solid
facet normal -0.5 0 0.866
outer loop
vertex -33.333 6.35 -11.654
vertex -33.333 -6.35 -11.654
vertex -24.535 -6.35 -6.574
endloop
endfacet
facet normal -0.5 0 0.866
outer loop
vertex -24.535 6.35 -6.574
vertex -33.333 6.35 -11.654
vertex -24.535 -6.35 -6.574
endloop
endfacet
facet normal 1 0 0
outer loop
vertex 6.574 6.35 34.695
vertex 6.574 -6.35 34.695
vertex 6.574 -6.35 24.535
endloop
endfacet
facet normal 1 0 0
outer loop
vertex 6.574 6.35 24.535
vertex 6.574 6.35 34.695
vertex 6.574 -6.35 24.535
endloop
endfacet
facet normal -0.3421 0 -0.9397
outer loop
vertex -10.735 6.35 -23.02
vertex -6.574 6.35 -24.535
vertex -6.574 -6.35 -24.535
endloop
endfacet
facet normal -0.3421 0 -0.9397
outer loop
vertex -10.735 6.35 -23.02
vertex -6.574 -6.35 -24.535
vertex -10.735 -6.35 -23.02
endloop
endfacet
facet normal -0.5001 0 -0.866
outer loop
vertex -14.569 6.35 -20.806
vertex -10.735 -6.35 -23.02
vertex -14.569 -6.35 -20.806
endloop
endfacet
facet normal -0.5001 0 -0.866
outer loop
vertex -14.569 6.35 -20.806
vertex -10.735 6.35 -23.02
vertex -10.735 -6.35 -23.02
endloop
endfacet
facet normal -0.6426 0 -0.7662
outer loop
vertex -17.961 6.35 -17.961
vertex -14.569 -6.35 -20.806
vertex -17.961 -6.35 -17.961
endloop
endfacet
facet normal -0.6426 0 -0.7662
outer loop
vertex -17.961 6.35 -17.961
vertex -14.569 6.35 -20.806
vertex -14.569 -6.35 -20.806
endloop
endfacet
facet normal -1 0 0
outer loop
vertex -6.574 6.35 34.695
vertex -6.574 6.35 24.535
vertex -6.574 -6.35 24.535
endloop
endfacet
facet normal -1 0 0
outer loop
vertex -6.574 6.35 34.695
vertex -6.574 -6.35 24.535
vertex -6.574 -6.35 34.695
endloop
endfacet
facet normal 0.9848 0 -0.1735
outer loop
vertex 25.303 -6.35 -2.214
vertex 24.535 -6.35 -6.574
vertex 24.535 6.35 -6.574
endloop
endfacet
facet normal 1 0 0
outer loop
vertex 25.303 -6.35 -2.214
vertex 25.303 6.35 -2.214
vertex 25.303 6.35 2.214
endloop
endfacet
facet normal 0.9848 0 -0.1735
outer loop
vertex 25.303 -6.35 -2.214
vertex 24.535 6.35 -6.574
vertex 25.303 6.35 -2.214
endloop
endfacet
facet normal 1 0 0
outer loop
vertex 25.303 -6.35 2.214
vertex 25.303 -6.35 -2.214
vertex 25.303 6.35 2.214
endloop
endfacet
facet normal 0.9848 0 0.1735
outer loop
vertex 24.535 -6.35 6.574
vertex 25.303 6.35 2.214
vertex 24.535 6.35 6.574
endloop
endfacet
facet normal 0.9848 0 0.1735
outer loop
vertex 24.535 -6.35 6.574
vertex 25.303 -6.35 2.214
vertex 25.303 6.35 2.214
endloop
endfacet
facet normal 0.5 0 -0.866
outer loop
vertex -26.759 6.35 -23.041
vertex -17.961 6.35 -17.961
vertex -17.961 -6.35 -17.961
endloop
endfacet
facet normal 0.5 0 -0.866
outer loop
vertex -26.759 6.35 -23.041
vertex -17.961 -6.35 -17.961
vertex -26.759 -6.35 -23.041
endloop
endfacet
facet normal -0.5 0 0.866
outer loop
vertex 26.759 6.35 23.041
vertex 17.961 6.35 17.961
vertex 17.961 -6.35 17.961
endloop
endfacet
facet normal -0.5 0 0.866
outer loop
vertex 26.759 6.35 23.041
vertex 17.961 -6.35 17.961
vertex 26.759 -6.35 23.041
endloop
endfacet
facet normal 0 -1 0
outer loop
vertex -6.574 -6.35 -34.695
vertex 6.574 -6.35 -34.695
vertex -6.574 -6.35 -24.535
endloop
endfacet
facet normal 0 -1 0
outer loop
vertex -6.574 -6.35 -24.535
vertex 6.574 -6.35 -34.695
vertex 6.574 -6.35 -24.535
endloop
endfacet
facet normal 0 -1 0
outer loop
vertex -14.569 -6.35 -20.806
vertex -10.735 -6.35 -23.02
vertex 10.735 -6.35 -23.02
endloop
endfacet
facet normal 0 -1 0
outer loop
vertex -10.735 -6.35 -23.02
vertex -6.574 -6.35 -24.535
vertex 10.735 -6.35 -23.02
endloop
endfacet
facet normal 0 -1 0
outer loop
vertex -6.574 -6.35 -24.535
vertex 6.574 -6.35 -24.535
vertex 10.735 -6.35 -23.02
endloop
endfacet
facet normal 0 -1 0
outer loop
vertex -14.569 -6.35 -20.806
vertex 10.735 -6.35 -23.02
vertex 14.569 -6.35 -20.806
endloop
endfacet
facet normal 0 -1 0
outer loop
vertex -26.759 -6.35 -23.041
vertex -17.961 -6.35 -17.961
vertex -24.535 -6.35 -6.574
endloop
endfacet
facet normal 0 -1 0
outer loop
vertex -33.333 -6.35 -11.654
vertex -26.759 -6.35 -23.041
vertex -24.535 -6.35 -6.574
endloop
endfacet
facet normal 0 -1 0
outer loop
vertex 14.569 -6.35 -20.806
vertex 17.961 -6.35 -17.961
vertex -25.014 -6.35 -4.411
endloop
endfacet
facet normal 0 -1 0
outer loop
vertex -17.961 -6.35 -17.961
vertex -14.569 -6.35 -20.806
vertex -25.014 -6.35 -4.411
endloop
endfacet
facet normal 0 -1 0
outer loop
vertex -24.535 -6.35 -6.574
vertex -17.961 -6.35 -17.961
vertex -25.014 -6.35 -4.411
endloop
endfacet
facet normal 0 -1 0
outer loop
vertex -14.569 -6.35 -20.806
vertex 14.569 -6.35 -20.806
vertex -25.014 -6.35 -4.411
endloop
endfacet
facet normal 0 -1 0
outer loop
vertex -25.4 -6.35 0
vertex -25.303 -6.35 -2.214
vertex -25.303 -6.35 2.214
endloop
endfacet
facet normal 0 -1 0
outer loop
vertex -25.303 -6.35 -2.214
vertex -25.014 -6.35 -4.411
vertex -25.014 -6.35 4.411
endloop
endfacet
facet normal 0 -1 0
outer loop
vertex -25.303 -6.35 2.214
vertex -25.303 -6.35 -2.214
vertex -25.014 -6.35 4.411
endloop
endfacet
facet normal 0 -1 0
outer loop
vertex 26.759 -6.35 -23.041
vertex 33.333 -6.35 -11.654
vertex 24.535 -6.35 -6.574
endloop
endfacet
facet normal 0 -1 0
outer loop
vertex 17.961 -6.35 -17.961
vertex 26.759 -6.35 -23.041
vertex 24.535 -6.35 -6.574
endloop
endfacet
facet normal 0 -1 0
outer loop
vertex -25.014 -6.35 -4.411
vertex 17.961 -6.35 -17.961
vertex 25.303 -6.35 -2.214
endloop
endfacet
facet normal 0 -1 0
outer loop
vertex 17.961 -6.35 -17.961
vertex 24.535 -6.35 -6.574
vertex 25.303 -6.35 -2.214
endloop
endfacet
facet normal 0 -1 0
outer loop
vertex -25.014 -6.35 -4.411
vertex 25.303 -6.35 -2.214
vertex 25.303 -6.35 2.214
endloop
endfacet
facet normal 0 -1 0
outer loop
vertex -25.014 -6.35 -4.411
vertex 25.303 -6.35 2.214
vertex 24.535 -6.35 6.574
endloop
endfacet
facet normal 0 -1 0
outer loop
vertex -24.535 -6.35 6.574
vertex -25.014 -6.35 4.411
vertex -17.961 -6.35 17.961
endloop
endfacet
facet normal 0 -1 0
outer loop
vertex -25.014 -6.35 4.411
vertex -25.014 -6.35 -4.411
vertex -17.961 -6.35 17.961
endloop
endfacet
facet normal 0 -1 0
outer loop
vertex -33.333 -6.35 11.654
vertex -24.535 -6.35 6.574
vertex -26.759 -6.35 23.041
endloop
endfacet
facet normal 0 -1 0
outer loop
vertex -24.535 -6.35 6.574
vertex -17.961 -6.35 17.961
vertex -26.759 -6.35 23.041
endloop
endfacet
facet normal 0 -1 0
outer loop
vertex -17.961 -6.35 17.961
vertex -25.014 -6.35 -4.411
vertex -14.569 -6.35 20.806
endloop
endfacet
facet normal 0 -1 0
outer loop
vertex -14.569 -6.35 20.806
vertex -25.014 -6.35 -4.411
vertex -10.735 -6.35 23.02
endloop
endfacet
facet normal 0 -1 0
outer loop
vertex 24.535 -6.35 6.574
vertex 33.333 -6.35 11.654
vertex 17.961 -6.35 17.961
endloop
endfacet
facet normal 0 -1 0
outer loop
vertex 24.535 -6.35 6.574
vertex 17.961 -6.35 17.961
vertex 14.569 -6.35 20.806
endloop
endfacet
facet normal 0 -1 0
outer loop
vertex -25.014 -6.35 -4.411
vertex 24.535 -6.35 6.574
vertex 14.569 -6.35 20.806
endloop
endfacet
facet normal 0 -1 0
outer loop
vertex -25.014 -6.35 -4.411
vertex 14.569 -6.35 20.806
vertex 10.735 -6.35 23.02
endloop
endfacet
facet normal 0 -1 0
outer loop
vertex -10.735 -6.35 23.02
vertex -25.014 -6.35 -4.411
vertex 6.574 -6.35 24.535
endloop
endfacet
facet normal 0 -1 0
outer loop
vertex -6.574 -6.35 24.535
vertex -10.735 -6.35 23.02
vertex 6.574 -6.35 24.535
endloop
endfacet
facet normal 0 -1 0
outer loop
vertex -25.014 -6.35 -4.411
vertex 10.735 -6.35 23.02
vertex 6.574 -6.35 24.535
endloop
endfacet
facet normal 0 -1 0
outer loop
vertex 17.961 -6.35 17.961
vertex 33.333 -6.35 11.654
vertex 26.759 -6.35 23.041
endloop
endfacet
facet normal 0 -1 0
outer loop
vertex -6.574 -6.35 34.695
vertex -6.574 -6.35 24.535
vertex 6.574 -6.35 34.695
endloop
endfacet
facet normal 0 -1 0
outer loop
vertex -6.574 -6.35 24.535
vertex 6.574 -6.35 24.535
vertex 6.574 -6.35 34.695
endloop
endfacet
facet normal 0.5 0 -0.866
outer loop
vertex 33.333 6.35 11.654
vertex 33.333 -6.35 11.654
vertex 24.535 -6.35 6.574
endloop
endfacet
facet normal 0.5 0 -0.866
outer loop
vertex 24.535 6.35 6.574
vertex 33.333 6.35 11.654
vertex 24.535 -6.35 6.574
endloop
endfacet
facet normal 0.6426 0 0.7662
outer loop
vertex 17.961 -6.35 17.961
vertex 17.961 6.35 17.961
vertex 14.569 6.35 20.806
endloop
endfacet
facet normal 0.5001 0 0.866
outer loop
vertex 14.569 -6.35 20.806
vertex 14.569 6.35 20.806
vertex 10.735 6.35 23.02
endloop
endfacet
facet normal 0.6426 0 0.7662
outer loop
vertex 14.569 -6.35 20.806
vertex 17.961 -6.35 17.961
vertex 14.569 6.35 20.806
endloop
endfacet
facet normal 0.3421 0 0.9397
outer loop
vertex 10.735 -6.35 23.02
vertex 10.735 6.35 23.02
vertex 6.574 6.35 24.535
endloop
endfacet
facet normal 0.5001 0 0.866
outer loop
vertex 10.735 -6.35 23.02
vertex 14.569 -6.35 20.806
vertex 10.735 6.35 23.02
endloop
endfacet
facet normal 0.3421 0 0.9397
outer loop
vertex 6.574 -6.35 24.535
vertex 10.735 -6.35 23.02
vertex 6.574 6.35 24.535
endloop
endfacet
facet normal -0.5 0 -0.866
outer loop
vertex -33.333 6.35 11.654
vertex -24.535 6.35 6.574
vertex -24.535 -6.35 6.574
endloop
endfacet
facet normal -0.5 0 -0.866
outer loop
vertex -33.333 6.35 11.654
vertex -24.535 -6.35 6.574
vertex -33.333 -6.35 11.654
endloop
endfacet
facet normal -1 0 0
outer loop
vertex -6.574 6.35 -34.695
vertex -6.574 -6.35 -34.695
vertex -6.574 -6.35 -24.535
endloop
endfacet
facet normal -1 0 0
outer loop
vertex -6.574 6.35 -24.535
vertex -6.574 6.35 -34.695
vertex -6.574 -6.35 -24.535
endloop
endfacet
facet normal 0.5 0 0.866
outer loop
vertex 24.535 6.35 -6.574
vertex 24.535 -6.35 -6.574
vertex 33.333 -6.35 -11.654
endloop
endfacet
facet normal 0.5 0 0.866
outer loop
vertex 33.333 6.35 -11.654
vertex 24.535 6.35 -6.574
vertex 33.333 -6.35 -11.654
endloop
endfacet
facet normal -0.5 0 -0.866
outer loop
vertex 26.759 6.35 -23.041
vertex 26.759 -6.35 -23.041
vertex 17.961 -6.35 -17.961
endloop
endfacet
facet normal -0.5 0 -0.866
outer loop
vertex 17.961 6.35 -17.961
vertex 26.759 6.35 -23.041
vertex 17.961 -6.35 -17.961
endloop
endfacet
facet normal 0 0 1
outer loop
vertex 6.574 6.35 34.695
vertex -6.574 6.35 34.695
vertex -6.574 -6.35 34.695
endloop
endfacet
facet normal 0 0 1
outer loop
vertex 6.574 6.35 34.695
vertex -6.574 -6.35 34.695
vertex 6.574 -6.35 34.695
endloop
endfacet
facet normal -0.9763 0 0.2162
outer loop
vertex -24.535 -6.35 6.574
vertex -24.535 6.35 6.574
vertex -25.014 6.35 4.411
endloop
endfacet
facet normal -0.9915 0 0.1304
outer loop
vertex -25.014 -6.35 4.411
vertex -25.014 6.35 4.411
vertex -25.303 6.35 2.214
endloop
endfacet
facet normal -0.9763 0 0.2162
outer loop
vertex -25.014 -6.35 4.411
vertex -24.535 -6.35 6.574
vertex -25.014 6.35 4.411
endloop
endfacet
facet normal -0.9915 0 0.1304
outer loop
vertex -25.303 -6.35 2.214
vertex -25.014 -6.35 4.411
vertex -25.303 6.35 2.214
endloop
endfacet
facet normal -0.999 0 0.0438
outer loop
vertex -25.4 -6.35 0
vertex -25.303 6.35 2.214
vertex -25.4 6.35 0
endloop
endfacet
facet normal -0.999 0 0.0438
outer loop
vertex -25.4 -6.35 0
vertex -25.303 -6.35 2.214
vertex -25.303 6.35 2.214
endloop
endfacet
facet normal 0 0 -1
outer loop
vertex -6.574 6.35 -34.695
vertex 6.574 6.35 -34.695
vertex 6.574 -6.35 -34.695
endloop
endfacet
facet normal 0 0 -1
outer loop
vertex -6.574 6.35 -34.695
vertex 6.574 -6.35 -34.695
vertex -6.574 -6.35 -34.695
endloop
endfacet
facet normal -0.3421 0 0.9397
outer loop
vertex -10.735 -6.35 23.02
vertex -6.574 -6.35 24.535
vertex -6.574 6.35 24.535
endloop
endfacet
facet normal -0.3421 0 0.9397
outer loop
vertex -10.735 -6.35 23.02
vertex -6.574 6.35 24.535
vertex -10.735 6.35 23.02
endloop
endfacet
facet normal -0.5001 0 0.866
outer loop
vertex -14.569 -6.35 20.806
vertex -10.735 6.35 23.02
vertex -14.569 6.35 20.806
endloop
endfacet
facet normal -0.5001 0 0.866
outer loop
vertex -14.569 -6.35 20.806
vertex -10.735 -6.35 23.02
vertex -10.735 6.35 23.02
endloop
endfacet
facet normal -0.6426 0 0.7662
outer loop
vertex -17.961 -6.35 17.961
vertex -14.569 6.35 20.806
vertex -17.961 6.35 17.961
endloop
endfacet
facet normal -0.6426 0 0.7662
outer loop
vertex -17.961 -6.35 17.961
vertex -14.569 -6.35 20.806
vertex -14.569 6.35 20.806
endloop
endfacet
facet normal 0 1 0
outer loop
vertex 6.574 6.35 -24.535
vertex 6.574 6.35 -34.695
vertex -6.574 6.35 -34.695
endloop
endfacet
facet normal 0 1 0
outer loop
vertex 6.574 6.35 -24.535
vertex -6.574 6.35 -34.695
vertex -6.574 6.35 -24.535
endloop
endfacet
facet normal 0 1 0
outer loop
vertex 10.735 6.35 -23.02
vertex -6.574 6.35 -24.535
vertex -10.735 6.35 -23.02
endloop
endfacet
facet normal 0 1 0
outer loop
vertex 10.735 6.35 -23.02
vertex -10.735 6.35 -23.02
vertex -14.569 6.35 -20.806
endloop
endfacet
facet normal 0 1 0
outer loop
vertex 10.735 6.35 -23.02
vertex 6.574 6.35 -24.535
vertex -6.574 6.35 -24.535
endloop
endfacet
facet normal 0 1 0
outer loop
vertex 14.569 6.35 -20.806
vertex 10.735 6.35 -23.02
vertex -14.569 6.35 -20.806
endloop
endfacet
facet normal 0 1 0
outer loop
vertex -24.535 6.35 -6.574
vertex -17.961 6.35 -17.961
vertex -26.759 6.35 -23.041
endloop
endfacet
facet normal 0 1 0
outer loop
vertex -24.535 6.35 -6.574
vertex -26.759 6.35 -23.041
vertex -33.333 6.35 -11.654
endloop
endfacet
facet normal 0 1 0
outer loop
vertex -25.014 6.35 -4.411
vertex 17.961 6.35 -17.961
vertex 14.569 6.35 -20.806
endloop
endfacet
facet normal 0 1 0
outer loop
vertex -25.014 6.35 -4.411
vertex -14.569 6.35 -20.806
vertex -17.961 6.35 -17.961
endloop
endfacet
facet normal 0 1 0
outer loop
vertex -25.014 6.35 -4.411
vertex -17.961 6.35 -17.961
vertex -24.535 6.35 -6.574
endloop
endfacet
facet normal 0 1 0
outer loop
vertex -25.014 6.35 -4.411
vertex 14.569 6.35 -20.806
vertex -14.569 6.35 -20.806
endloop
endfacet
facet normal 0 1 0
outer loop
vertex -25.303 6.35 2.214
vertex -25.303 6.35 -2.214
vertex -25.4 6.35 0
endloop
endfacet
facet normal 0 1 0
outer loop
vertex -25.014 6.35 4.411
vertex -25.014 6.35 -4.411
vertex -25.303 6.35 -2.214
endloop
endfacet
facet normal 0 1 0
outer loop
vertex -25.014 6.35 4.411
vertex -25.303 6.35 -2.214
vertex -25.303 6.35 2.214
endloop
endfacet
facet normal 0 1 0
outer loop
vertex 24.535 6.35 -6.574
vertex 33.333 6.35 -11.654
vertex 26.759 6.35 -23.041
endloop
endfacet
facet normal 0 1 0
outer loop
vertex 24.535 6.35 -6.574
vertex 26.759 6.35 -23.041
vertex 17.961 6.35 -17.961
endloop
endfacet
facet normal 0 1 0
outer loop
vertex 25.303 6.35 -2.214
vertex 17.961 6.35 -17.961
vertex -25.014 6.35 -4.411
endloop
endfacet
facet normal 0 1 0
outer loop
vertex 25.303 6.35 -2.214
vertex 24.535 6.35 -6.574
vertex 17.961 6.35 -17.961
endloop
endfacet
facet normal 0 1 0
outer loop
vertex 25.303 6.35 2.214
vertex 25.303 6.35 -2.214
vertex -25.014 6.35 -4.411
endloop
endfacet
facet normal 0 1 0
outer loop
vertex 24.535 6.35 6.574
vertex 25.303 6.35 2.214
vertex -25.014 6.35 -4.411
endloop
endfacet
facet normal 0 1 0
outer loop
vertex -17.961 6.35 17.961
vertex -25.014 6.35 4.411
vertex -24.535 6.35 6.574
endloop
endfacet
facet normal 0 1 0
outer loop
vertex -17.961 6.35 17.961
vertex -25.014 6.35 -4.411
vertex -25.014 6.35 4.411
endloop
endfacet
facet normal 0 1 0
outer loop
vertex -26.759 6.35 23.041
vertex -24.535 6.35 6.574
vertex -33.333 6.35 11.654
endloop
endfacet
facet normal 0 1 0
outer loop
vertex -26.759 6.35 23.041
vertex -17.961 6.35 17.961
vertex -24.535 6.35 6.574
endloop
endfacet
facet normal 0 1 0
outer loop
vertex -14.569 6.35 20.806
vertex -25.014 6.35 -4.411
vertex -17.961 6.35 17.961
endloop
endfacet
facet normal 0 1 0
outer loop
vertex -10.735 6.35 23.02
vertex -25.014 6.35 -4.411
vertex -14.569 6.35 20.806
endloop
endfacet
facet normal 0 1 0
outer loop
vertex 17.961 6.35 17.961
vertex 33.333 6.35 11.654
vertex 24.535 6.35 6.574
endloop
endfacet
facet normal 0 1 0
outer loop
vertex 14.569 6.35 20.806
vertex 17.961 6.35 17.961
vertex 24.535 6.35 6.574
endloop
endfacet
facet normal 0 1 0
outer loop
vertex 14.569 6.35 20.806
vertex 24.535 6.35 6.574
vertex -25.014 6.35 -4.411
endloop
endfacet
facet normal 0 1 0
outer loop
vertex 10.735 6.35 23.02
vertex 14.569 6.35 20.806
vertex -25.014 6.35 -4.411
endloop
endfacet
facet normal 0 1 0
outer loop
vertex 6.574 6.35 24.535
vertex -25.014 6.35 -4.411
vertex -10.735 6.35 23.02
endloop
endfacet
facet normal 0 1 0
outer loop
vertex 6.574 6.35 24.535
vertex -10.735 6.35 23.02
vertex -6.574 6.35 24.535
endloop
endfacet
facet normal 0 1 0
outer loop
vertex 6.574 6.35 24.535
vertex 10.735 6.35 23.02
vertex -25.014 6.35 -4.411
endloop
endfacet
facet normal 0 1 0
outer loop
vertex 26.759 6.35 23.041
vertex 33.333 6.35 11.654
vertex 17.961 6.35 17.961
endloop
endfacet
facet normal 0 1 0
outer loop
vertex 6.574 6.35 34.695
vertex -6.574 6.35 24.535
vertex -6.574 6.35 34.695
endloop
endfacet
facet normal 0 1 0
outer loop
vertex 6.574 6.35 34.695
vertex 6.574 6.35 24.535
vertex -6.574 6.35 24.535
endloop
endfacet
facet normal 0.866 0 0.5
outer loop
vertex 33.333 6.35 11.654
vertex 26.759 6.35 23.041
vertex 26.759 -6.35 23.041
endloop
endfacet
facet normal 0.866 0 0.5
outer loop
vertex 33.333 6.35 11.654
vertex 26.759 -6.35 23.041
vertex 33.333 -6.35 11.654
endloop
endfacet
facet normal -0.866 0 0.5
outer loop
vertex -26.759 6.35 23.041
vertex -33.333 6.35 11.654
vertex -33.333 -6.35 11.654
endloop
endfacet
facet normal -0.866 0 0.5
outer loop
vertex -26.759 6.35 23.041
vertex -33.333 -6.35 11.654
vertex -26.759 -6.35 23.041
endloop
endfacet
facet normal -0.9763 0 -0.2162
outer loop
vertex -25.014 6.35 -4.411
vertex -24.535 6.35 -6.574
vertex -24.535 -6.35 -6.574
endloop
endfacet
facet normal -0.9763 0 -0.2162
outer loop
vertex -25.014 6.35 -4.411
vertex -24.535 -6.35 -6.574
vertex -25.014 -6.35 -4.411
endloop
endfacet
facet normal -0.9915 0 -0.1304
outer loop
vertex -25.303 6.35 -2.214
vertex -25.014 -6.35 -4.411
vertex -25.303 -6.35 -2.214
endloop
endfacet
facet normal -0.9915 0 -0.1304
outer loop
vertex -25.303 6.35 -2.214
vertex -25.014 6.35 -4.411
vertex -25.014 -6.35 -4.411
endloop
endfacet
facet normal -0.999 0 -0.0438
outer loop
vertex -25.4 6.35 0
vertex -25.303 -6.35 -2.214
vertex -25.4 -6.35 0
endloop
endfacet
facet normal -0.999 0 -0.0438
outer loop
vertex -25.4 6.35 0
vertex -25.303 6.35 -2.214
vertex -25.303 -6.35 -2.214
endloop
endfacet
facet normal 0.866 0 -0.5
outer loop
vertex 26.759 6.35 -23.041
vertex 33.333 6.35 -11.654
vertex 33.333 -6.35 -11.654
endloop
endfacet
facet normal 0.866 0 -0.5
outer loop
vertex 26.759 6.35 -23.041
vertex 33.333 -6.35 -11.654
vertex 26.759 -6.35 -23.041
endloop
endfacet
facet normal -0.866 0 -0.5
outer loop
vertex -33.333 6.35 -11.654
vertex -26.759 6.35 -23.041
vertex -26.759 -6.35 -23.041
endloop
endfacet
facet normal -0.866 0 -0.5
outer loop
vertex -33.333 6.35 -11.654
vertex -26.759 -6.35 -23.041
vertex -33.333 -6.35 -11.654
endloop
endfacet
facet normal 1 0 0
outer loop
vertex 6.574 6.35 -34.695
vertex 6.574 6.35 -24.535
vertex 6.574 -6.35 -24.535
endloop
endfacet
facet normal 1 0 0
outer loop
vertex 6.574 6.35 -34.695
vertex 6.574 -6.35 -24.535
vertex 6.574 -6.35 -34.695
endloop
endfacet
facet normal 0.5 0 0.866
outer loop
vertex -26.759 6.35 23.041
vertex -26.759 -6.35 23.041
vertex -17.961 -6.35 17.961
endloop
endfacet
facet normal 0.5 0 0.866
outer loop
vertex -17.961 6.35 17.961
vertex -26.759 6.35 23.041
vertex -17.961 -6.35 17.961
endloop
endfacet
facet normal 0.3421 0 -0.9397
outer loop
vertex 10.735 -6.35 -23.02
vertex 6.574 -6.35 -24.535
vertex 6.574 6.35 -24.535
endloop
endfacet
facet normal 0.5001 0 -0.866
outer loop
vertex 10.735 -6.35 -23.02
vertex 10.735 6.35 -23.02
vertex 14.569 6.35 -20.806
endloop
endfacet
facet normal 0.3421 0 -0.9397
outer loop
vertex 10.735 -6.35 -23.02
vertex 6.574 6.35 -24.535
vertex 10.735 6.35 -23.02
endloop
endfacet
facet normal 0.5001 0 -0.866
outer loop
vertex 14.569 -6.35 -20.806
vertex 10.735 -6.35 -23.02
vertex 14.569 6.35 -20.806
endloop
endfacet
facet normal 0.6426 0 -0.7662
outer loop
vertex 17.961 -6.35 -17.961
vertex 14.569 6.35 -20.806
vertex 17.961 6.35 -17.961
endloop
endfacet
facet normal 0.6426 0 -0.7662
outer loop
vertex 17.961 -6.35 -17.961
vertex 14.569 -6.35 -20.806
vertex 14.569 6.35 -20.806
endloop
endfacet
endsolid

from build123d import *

# Parameters (mm, degrees)
F0_R     = 25.4
F1_DEPTH = 6.35
F3_DEPTH = 12.7
F5_COUNT = 6


with BuildPart() as f1:
    # F0 (on Front) → F1 (new body, symmetric)
    with BuildSketch(Plane.XZ):
        Circle(F0_R)
    extrude(amount=F1_DEPTH, both=True)

    # F2 (on face) → F3 (join)
    with BuildSketch(Plane(origin=(0, 6.35, 0), x_dir=(-1, 0, 0), z_dir=(0, 1, 0))):
        Polygon((0, -24.534516), (0, 0), (-6.574004, -24.534516), align=None)
        Polygon((6.574004, -24.534516), (0, 0), (0, -24.534516), align=None)
        Polygon((6.574004, -34.694516), (6.574004, -24.534516), (0, -24.534516), (-6.574004, -24.534516), (-6.574004, -34.694516), align=None)
        with BuildLine():
            Line((-6.574004, -24.534516), (0, 0))
            Line((0, 0), (6.574004, -24.534516))
            ThreePointArc((6.574004, -24.534516), (20.151175, -15.46254), (25.4, 0))
            ThreePointArc((25.4, 0), (-15.46254, 20.151175), (-6.574004, -24.534516))
        make_face()
    extrude(amount=-F3_DEPTH)

    # F5: F1 ×6 about axis
    f5_axis = Axis((0, -24.47786, 0), (0, -1, 0))


with BuildPart() as f1_1:
    add(f1.part)
    for i in range(1, F5_COUNT):
        add(f1.part.rotate(f5_axis, i * 360 / F5_COUNT))


solid = f1_1.part
